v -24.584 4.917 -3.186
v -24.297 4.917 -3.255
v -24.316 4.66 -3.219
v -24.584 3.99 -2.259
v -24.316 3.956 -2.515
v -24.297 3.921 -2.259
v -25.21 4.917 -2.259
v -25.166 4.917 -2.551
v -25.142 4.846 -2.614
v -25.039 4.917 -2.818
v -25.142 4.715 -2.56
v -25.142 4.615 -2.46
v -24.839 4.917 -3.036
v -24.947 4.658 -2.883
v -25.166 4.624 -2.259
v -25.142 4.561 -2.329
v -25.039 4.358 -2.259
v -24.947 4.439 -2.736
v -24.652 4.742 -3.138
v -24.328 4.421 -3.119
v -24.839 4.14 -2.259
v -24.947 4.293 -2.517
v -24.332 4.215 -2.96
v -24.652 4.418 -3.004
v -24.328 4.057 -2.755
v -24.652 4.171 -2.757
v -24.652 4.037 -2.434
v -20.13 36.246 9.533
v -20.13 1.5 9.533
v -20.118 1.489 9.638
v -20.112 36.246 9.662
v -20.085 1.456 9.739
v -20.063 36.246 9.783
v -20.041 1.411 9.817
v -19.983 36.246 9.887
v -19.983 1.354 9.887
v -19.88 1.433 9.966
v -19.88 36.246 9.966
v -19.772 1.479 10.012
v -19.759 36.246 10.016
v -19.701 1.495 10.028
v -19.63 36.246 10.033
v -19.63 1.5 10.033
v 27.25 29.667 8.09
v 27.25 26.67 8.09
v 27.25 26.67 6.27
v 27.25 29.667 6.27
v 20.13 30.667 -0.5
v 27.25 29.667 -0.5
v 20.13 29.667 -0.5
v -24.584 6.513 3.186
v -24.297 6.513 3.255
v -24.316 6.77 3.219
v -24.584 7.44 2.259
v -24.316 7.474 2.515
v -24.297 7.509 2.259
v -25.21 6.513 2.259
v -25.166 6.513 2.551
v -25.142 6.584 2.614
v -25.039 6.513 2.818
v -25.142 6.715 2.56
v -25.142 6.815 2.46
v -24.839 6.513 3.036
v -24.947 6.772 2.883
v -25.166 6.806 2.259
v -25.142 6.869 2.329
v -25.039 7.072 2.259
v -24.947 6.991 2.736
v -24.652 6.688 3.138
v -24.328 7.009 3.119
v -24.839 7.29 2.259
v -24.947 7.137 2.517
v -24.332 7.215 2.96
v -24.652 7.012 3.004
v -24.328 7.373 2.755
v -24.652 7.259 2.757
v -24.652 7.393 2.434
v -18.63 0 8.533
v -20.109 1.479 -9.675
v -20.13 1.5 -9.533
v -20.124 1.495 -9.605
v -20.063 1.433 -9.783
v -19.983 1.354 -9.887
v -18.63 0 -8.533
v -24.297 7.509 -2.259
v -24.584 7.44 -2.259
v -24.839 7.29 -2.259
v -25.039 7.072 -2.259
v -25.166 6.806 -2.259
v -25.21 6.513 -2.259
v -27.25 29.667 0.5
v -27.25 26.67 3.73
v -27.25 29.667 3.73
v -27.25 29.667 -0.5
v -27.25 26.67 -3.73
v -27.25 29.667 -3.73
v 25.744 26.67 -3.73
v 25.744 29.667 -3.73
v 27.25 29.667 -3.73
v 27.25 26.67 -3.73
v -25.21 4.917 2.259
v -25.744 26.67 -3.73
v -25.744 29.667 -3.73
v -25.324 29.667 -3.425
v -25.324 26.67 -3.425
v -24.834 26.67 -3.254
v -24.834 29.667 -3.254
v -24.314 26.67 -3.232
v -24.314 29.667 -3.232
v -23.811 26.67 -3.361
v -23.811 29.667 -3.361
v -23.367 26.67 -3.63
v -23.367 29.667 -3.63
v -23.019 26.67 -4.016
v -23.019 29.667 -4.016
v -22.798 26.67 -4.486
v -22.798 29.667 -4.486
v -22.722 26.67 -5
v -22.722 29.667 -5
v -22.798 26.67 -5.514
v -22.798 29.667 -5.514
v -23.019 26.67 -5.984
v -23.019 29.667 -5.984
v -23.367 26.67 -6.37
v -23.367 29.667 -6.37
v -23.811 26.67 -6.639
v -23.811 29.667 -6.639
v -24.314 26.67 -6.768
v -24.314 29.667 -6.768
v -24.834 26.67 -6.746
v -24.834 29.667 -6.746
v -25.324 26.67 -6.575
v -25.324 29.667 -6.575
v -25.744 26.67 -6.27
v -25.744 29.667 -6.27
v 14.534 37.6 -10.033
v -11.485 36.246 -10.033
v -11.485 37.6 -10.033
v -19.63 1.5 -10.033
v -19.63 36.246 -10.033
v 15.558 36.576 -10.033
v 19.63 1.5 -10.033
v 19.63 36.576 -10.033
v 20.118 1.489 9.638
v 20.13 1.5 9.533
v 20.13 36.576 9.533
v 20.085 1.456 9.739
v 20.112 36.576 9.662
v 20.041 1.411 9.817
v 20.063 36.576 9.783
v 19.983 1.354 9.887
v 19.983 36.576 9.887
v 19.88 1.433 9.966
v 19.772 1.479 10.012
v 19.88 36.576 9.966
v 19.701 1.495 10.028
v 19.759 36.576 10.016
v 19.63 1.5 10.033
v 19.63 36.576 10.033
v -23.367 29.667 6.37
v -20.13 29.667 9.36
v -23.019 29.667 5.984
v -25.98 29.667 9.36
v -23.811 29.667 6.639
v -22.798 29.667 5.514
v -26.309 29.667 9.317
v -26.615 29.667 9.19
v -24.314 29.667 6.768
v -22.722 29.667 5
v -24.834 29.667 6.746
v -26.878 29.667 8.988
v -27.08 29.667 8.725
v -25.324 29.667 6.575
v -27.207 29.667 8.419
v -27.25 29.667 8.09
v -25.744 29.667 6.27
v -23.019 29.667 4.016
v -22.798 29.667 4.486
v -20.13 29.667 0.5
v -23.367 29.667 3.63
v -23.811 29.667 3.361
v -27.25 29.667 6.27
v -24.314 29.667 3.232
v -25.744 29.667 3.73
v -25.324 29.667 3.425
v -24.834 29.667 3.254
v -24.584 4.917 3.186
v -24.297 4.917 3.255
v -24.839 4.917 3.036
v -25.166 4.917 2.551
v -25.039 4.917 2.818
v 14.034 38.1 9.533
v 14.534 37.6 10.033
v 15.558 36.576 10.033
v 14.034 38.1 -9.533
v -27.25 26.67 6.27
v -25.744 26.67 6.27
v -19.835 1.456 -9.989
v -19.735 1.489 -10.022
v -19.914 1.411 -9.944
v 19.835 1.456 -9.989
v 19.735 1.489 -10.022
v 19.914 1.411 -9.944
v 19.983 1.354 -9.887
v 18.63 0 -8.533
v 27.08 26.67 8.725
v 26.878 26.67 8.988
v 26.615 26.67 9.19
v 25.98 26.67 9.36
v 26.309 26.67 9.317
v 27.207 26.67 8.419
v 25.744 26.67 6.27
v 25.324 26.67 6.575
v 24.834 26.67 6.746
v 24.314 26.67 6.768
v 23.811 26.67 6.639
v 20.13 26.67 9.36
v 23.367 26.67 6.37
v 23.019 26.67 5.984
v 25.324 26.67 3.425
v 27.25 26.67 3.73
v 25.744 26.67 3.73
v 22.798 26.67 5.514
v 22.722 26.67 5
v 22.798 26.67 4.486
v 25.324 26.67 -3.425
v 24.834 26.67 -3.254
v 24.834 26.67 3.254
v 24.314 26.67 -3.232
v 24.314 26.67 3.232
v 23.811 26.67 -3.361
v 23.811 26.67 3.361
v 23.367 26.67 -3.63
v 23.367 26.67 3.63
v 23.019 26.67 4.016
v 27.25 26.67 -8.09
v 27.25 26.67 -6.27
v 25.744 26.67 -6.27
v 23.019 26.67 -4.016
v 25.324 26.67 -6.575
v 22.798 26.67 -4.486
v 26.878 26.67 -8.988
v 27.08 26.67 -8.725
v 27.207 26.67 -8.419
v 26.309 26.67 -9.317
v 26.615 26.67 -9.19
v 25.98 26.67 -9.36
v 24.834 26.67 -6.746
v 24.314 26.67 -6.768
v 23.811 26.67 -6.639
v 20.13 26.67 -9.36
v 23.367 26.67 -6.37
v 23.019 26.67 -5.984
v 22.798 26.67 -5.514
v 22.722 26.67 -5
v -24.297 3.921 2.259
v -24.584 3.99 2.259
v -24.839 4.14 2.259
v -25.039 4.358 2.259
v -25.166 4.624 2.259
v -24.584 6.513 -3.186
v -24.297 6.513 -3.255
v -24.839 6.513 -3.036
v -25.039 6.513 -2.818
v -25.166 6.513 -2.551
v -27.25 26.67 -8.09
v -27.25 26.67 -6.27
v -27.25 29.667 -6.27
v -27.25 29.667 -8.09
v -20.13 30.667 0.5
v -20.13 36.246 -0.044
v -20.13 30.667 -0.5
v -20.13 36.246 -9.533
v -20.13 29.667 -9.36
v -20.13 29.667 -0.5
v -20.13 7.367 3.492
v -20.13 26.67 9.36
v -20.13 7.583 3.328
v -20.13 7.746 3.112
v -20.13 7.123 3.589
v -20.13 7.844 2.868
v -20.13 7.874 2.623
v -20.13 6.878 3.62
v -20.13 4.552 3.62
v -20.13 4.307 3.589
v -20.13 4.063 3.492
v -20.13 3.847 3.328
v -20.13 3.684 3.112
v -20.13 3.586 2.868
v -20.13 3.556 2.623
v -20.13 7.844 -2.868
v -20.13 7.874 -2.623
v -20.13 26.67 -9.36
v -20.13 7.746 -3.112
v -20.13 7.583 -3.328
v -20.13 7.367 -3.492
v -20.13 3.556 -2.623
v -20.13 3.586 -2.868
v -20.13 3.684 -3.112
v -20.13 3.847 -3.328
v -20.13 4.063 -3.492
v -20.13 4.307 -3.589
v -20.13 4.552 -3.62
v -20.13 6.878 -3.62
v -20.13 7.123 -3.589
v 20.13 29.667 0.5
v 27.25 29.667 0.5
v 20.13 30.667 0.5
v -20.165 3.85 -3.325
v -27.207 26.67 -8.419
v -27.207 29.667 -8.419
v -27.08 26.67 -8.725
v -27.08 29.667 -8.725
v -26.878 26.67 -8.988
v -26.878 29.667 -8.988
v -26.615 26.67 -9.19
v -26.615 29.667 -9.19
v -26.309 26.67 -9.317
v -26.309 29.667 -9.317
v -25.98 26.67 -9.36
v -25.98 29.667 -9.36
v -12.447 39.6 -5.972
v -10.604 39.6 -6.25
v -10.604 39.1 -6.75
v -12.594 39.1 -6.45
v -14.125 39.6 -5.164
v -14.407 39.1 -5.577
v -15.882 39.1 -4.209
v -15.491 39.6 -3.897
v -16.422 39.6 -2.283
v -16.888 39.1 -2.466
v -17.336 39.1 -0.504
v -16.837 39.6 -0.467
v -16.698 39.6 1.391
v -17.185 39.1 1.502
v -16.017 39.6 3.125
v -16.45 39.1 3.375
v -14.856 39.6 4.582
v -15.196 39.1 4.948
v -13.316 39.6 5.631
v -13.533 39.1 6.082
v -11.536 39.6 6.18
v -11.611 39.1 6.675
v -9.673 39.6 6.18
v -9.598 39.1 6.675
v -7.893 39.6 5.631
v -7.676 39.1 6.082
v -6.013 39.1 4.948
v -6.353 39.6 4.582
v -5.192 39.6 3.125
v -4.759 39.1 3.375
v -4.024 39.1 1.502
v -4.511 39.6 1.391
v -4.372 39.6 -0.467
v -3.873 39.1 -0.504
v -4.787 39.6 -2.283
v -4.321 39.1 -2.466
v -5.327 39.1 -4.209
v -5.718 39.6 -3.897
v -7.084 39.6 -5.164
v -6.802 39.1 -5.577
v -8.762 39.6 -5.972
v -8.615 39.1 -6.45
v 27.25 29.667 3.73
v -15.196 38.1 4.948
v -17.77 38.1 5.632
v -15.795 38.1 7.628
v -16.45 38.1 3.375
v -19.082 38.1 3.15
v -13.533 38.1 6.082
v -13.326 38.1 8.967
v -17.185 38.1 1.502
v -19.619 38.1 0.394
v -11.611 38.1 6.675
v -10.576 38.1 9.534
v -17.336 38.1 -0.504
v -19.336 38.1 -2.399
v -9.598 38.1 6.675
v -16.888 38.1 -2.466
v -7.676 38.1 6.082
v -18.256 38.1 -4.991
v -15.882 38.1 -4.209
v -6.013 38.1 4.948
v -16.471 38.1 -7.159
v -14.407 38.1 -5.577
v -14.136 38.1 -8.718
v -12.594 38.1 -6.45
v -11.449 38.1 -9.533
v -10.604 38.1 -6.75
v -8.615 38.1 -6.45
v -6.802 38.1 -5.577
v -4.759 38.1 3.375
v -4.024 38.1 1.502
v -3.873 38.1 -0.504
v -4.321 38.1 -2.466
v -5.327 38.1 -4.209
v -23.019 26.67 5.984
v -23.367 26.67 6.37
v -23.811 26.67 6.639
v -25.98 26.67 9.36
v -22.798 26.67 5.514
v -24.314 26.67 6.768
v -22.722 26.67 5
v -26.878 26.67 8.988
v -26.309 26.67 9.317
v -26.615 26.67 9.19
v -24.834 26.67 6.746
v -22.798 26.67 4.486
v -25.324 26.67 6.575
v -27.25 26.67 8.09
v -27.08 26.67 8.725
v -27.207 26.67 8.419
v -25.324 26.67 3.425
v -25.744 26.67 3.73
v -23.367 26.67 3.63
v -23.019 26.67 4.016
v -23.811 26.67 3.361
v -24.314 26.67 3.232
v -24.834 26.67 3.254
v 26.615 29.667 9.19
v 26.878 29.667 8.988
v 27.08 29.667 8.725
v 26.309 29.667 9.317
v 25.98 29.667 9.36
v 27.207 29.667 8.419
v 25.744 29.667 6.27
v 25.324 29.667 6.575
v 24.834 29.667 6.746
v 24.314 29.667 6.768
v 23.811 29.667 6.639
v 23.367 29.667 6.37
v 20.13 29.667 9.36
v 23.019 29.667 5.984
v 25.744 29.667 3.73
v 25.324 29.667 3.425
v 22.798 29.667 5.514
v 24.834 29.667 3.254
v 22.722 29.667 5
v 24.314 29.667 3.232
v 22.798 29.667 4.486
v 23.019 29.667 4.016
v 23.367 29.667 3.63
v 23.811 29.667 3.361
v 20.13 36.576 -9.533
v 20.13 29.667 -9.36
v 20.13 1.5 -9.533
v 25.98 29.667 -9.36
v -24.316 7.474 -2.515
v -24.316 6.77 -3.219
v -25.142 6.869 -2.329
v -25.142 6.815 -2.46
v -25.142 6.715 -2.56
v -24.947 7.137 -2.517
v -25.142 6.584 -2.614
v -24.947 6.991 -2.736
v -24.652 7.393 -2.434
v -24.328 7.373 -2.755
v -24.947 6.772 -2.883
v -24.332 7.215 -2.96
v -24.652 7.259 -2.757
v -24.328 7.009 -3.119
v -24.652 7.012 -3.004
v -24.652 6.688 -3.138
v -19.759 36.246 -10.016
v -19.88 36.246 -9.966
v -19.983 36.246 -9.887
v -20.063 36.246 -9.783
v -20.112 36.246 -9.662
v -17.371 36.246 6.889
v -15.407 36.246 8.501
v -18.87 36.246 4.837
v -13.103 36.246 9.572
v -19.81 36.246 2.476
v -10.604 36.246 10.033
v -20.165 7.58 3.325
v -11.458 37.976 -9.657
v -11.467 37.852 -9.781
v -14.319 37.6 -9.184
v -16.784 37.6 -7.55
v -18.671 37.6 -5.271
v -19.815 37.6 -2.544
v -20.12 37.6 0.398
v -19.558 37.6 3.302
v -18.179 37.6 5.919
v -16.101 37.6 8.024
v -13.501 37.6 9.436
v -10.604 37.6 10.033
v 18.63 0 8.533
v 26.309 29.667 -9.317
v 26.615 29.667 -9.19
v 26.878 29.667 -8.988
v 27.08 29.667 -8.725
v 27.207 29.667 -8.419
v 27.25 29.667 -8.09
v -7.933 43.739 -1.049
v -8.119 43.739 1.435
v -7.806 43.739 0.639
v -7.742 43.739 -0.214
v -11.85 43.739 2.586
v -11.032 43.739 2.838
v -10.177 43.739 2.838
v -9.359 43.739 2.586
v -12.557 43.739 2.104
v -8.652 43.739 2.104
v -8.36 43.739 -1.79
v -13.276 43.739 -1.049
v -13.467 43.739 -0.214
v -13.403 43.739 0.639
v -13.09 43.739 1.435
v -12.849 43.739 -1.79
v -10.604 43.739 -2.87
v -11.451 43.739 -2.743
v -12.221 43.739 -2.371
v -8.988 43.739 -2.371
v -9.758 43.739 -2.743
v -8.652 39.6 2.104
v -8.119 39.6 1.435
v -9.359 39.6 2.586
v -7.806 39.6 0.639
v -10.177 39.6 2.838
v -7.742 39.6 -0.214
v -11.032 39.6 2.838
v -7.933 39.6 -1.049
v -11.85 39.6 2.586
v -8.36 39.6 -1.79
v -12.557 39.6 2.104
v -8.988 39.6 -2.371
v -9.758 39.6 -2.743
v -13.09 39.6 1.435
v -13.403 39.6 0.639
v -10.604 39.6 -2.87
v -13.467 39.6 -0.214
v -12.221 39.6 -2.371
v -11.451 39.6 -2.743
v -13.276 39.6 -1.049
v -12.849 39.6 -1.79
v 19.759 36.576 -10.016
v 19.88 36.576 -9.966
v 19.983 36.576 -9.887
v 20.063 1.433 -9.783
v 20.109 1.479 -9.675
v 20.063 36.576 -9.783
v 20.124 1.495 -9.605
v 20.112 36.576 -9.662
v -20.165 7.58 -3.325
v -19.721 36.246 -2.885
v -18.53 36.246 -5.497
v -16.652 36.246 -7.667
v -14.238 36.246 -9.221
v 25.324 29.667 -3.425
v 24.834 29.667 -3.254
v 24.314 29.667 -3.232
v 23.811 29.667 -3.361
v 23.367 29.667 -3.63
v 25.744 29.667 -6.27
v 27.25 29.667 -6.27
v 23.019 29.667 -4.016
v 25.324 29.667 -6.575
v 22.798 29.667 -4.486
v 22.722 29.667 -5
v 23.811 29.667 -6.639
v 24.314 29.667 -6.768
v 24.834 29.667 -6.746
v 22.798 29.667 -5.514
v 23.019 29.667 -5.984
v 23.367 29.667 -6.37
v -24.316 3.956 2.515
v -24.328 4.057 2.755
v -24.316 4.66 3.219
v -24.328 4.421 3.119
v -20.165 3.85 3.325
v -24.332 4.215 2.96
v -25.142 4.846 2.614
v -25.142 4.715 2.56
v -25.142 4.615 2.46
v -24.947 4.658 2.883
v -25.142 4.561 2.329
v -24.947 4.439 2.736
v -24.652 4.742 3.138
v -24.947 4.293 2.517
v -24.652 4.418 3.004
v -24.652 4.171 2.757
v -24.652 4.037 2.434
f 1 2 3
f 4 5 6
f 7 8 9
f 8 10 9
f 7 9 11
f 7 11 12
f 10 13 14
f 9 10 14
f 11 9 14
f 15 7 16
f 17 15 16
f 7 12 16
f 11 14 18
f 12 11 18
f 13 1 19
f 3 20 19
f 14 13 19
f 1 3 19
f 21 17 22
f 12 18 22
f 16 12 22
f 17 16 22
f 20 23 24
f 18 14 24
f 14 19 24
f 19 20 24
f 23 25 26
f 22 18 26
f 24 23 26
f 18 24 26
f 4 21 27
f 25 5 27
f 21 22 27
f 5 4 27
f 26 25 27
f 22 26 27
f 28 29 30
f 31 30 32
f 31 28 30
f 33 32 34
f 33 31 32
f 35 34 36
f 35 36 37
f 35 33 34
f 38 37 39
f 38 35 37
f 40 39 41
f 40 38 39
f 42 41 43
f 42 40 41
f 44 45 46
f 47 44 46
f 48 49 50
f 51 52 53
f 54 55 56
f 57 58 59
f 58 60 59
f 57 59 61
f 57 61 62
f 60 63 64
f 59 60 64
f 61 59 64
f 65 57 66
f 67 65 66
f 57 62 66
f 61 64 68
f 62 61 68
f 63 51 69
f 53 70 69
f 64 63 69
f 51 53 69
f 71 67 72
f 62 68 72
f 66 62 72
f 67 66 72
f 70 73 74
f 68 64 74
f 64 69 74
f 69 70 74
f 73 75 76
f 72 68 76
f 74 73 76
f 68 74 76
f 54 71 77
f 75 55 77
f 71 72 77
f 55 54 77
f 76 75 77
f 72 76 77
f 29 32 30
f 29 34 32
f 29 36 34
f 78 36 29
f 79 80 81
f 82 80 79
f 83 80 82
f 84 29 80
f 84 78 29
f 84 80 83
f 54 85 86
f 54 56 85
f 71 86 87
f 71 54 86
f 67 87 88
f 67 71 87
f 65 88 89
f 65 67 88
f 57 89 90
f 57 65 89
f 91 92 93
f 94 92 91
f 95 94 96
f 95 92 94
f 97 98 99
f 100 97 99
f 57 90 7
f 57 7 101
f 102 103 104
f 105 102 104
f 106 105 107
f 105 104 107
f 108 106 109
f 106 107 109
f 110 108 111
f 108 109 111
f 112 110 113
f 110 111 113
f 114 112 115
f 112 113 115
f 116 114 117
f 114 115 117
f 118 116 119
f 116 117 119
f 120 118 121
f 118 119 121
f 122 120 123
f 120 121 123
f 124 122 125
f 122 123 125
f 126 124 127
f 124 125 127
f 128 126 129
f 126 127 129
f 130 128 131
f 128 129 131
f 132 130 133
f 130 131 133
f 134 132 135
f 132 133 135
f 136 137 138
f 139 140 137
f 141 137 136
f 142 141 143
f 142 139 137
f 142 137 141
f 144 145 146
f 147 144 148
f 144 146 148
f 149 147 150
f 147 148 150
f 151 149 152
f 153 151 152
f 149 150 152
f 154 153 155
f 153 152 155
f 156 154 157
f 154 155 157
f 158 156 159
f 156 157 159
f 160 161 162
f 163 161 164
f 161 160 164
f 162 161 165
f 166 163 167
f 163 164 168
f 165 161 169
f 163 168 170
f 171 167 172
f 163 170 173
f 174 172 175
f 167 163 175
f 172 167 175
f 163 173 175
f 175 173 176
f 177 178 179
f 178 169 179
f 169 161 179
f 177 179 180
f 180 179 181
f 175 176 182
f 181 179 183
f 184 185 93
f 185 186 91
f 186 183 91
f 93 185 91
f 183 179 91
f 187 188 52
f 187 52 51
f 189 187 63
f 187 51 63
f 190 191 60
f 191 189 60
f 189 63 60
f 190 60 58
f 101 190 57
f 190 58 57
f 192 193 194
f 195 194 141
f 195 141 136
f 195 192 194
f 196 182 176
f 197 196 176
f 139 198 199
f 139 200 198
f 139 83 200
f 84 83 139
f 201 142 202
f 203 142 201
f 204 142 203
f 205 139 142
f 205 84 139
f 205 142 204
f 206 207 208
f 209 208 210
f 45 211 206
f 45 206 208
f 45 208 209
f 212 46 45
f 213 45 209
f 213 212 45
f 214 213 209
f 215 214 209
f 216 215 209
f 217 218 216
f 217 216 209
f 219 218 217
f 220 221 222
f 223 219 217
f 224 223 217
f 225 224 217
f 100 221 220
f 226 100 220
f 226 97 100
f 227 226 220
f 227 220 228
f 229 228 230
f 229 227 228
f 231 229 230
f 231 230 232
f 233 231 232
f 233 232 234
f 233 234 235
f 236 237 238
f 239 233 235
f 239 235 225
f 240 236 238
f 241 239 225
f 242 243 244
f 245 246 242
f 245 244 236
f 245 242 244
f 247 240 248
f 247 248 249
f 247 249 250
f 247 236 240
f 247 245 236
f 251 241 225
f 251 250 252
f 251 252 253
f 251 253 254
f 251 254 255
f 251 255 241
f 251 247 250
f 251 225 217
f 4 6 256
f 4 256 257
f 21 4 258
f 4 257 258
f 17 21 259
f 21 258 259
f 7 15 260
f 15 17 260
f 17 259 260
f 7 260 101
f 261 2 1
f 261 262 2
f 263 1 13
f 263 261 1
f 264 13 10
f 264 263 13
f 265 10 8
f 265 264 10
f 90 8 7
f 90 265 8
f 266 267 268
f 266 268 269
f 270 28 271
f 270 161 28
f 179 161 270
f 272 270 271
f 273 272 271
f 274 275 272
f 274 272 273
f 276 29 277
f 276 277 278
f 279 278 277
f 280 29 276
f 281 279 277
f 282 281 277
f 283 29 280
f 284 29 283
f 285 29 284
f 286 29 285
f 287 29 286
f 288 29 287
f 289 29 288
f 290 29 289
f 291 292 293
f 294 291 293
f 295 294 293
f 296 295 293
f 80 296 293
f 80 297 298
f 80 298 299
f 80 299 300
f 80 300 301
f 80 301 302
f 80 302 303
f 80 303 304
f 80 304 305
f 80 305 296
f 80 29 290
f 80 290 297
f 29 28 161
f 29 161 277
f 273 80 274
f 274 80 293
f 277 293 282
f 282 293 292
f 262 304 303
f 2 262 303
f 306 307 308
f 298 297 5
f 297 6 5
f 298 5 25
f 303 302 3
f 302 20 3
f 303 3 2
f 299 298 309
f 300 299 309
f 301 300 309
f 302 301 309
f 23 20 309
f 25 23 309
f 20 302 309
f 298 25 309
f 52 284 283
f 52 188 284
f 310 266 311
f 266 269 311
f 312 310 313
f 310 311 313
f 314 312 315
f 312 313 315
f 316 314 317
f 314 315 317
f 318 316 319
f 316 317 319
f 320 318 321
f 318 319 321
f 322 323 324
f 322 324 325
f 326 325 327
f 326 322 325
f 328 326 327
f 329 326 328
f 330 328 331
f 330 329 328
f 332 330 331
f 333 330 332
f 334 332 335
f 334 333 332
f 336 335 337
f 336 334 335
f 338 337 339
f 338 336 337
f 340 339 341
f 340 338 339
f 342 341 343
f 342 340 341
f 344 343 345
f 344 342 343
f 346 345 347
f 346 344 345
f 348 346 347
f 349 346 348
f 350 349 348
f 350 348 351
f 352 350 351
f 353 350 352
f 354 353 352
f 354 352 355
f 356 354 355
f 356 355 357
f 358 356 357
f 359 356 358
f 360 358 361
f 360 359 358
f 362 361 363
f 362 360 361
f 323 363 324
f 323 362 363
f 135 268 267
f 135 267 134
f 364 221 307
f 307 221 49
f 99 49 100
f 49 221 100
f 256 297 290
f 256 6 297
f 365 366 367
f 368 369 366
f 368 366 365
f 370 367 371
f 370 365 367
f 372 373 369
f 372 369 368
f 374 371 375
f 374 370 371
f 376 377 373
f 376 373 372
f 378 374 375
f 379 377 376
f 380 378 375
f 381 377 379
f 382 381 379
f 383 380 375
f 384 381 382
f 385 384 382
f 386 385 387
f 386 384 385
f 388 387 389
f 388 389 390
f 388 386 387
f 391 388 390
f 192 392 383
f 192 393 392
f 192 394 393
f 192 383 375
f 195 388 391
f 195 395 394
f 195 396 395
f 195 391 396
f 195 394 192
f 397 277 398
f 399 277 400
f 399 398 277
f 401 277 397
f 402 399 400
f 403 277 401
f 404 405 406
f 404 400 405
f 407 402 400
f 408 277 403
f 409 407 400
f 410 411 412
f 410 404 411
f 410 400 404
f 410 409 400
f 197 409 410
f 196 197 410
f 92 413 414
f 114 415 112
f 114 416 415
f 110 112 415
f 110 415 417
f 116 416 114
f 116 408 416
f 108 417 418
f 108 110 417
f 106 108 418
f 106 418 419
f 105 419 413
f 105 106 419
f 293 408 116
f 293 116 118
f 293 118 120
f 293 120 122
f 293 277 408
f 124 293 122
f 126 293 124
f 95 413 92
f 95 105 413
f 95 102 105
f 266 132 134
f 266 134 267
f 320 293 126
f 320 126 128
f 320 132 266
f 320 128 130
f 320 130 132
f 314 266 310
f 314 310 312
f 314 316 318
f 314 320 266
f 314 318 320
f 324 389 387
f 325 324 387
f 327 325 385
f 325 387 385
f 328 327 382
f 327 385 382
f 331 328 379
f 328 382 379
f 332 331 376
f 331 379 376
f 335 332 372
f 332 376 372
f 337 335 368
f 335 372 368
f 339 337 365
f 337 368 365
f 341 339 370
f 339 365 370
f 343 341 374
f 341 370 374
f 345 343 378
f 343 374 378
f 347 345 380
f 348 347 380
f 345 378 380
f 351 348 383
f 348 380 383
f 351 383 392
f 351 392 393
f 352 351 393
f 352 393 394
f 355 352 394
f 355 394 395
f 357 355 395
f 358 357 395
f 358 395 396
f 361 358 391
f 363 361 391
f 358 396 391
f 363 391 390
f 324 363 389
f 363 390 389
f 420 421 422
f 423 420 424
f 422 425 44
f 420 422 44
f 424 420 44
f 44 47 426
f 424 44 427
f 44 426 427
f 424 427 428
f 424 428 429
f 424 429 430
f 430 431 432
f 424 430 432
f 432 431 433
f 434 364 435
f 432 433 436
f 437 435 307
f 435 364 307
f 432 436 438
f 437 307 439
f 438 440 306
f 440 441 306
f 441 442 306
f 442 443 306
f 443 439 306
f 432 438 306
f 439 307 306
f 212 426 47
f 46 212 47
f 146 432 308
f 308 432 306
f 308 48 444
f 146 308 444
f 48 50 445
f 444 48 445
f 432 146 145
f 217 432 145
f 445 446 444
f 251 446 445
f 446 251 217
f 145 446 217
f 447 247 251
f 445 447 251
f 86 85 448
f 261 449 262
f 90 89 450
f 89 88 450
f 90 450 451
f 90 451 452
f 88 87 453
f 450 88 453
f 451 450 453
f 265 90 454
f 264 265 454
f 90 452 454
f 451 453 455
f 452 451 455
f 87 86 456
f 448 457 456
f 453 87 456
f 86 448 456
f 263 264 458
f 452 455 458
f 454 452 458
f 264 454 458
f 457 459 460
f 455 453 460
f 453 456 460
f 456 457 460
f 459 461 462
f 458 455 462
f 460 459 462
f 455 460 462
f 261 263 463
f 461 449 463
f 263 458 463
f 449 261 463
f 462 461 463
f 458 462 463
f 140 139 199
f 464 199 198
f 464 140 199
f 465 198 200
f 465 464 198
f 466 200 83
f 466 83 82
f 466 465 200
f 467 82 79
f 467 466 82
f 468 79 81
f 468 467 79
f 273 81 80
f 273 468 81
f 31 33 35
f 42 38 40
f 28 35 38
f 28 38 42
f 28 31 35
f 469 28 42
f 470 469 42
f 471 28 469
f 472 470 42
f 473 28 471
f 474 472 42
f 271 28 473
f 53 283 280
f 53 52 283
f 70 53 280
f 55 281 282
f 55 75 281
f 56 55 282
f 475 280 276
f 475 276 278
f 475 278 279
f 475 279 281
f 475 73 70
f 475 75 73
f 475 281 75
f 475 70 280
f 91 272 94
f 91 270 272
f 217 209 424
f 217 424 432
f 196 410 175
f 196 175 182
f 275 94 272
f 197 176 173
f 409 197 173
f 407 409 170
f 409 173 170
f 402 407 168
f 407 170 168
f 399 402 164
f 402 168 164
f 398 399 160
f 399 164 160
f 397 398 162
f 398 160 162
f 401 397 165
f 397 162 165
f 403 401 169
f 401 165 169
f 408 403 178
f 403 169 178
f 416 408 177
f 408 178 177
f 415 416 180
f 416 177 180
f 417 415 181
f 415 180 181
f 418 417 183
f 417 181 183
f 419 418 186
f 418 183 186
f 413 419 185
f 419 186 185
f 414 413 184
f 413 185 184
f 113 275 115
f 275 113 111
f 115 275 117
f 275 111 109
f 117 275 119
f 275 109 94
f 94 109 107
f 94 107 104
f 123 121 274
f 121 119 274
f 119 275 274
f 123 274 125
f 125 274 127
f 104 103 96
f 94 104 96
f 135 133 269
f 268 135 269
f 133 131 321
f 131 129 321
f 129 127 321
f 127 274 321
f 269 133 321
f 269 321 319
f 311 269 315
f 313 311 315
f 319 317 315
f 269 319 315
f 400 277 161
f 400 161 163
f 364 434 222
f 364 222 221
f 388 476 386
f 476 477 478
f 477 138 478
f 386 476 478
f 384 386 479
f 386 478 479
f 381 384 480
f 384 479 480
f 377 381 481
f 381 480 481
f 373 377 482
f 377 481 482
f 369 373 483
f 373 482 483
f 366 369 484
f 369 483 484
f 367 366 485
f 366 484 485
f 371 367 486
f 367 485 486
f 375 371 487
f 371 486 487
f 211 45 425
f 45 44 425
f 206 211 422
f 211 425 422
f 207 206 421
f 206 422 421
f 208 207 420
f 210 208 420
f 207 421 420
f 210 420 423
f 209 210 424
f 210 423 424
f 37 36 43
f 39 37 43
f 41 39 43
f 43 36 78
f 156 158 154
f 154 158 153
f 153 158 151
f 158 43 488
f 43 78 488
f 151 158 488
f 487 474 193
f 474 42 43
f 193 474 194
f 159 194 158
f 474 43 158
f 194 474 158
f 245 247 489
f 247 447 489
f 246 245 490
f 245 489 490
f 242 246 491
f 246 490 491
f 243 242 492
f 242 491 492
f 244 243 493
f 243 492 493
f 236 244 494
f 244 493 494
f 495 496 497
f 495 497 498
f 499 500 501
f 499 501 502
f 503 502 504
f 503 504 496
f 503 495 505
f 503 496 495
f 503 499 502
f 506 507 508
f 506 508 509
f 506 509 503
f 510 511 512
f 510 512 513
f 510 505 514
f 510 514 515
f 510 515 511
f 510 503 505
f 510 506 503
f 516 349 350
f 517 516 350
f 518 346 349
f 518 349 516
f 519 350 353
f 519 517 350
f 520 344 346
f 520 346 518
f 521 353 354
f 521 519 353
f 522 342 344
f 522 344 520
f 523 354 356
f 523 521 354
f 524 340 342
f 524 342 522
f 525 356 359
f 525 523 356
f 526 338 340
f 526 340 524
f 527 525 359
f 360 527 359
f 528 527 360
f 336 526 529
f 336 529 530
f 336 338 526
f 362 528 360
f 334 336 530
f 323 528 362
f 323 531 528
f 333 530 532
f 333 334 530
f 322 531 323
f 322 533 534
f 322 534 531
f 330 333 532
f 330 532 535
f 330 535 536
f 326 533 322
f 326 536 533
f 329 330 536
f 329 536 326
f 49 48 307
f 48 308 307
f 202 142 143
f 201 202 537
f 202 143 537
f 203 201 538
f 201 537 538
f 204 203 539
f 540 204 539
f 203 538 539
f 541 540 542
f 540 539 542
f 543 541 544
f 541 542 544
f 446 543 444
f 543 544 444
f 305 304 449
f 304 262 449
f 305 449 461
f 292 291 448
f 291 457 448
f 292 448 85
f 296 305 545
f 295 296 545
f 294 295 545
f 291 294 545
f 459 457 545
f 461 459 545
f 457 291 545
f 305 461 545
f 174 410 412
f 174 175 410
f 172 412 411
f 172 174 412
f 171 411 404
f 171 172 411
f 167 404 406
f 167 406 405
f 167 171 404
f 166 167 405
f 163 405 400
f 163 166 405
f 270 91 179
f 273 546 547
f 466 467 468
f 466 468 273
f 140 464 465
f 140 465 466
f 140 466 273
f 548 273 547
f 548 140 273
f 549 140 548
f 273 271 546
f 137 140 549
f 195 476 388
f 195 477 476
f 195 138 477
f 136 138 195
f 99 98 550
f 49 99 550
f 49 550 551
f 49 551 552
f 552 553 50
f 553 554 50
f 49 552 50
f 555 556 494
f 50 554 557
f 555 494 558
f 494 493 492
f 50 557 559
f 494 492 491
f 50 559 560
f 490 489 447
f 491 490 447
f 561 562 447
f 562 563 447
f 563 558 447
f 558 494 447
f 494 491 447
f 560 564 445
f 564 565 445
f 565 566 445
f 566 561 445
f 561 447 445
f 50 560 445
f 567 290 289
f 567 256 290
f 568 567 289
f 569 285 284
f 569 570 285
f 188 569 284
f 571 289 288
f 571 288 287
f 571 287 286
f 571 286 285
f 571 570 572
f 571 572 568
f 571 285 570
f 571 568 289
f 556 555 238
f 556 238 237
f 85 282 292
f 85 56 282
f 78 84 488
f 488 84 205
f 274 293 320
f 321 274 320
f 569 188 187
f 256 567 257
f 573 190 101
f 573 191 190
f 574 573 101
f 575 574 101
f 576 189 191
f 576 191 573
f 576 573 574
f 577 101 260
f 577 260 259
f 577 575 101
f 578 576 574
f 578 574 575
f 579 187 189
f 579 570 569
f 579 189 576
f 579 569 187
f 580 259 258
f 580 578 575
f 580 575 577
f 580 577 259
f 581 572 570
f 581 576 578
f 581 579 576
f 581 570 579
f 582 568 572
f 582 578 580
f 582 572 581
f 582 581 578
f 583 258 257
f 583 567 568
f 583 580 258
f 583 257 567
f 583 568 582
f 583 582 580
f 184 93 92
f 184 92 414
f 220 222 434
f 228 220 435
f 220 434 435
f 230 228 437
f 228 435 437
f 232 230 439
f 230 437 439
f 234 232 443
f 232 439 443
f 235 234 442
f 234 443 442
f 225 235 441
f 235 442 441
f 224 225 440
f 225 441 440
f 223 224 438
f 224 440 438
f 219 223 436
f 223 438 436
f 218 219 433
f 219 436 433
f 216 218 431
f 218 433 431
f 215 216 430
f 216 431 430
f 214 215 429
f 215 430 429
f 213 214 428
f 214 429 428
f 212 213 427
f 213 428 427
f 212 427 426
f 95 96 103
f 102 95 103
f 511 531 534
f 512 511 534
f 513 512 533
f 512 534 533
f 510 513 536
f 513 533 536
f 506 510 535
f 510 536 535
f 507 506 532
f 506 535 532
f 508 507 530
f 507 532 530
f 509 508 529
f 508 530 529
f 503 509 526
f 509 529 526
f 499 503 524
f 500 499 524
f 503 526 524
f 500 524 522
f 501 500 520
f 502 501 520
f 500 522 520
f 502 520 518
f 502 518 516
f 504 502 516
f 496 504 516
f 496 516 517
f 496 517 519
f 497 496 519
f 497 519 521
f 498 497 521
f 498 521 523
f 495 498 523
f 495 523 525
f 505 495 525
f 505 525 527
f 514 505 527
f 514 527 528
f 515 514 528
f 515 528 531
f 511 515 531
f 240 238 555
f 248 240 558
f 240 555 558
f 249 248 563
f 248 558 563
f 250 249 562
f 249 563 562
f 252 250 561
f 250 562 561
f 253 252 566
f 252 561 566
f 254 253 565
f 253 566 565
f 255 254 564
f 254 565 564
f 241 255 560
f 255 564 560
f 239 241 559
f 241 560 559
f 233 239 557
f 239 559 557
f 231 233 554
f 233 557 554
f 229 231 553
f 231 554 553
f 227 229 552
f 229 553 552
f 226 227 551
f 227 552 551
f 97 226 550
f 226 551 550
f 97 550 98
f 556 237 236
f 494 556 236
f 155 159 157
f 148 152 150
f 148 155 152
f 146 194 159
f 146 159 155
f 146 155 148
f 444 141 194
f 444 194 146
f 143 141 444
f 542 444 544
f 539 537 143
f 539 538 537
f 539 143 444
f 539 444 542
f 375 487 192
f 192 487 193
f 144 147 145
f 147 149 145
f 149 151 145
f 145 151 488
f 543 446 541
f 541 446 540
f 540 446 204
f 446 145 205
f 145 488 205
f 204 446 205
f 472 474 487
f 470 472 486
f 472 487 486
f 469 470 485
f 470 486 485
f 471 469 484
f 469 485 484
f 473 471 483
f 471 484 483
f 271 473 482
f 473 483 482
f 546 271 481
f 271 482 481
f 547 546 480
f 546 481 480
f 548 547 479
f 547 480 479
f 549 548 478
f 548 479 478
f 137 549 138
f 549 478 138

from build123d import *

# Parameters (mm, degrees)
SKETCH1_W           = 40.259
SKETCH1_H           = 20.066
BOSS_EXTRUDE1_DEPTH = 38.1
SKETCH2_W           = 54.5
SKETCH2_H           = 18.7198
BOSS_EXTRUDE2_DEPTH = 2.9972
SKETCH3_R           = 2.8702
BOSS_EXTRUDE3_DEPTH = 5.6388
SKETCH4_R           = 1.778
CUT_EXTRUDE1_DEPTH  = 42.513447759
SKETCH5_W           = 7.62
SKETCH5_H           = 2.54
SKETCH5_W_2         = 6.35
CUT_EXTRUDE2_DEPTH  = 42.513447759
FILLET2_R           = 1.27
SKETCH6_W           = 7.239
SKETCH6_H           = 4.318
BOSS_EXTRUDE4_DEPTH = 5.08
BOSS_EXTRUDE4_TAPER = 5
SKETCH7_W           = 4.572
SKETCH7_H           = 20.066
CUT_EXTRUDE3_DEPTH  = 1.524
CHAMFER1_SIZE       = 1.524
CUT_EXTRUDE4_DEPTH  = 1.8542
SKETCH9_R           = 6.75
BOSS_EXTRUDE5_DEPTH = 1.5
CHAMFER2_SIZE       = 0.5
CHAMFER3_SIZE       = 1.5
FILLET3_R           = 0.5
BOSS_EXTRUDE6_DEPTH = 0.5
FILLET4_R           = 1


with BuildPart() as part:
    # Sketch1 → Boss-Extrude1 (new body)
    with BuildSketch(Plane(origin=(0, 0, 0), x_dir=(1, 0, 0), z_dir=(0, 1, 0))):
        Rectangle(SKETCH1_W, SKETCH1_H)
    extrude(amount=BOSS_EXTRUDE1_DEPTH)

    # Sketch2 → Boss-Extrude2 (add)
    with BuildSketch(Plane(origin=(0, 26.67, 0), x_dir=(-1, 0, 0), z_dir=(0, -1, 0))):
        Rectangle(SKETCH2_W, SKETCH2_H)
    extrude(amount=-BOSS_EXTRUDE2_DEPTH)

    # Sketch3 → Boss-Extrude3 (add)
    with BuildSketch(Plane(origin=(0, 38.1, 0), x_dir=(1, 0, 0), z_dir=(0, 1, 0))):
        with Locations(Location((-10.6045, 0, 0), (0, 0, 90))):
            Circle(SKETCH3_R)
    extrude(amount=BOSS_EXTRUDE3_DEPTH)

    # Sketch4 → Cut-Extrude1 (cut, through all)
    with BuildSketch(Plane(origin=(0, 29.6672, 0), x_dir=(1, 0, 0), z_dir=(0, 1, 0))):
        with Locations(Location((-24.5, 5, 0), (0, 0, 270))):
            Circle(SKETCH4_R)
        with Locations(Location((-24.5, -5, 0), (0, 0, 270))):
            Circle(SKETCH4_R)
        with Locations(Location((24.5, -5, 0), (0, 0, 270))):
            Circle(SKETCH4_R)
        with Locations(Location((24.5, 5, 0), (0, 0, 270))):
            Circle(SKETCH4_R)
    extrude(amount=-CUT_EXTRUDE1_DEPTH, mode=Mode.SUBTRACT)

    # Sketch5 → Cut-Extrude2 (cut, through all)
    with BuildSketch(Plane(origin=(0, 29.6672, 0), x_dir=(1, 0, 0), z_dir=(0, 1, 0))):
        with Locations((-28.31, 5)):
            Rectangle(SKETCH5_W, SKETCH5_H)
        with Locations((-27.675, -5)):
            Rectangle(SKETCH5_W_2, SKETCH5_H)
        with Locations((27.675, 5)):
            Rectangle(SKETCH5_W_2, SKETCH5_H)
        with Locations((27.675, -5)):
            Rectangle(SKETCH5_W_2, SKETCH5_H)
    extrude(amount=-CUT_EXTRUDE2_DEPTH, mode=Mode.SUBTRACT)

    # Fillet2
    fillet2_edges = [part.edges().sort_by_distance(p)[0] for p in [
        (27.25, 28.1686, -9.3599),
        (-27.25, 28.1686, 9.3599),
        (27.25, 28.1686, 9.3599),
        (-27.25, 28.1686, -9.3599),
    ]]
    fillet(fillet2_edges, radius=FILLET2_R)

    # Sketch6 → Boss-Extrude4 (add)
    with BuildSketch(Plane.ZY.offset(20.1295)):
        with Locations((0, 5.715)):
            Rectangle(SKETCH6_W, SKETCH6_H)
    extrude(amount=BOSS_EXTRUDE4_DEPTH, taper=BOSS_EXTRUDE4_TAPER)

    # Sketch7 → Cut-Extrude3 (cut)
    with BuildSketch(Plane(origin=(0, 38.1, 0), x_dir=(1, 0, 0), z_dir=(0, 1, 0))):
        with Locations((17.8435, 0)):
            Rectangle(SKETCH7_W, SKETCH7_H)
    extrude(amount=-CUT_EXTRUDE3_DEPTH, mode=Mode.SUBTRACT)

    # Chamfer1
    chamfer1_edges = [part.edges().sort_by_distance(p)[0] for p in [
        (15.5575, 38.1, 0),
    ]]
    chamfer(chamfer1_edges, length=CHAMFER1_SIZE - 0.0001)  # a hair under: the kernel refuses the full size

    # Sketch8 → Cut-Extrude4 (cut)
    with BuildSketch(Plane(origin=(0, 38.1, 0), x_dir=(1, 0, 0), z_dir=(0, 1, 0))):
        with BuildLine():
            Line((-10.6045, 10.121534413), (-31.431367674, 17.812165279))
            Line((-31.431367674, 17.812165279), (-23.526690426, -15.868179363))
            Line((-23.526690426, -15.868179363), (-10.6045, -10.033))
            ThreePointArc((-10.6045, -10.033), (-20.1295, 0.044267206), (-10.6045, 10.121534413))
        make_face()
    extrude(amount=-CUT_EXTRUDE4_DEPTH, mode=Mode.SUBTRACT)

    # Sketch9 → Boss-Extrude5 (add)
    with BuildSketch(Plane(origin=(0, 38.1, 0), x_dir=(1, 0, 0), z_dir=(0, 1, 0))):
        with Locations(Location((-10.6045, 0, 0), (0, 0, 90))):
            Circle(SKETCH9_R)
    extrude(amount=BOSS_EXTRUDE5_DEPTH)

    # Chamfer2
    chamfer2_edges = [part.edges().sort_by_distance(p)[0] for p in [
        (1.274211255, 38.1, -10.033),
    ]]
    chamfer(chamfer2_edges, length=CHAMFER2_SIZE)
    chamfer2_2_edges = [part.edges().sort_by_distance(p)[0] for p in [
        (-20.022463004, 38.1, 1.421765307),
    ]]
    chamfer(chamfer2_2_edges, length=CHAMFER2_SIZE)
    chamfer2_3_edges = [part.edges().sort_by_distance(p)[0] for p in [
        (-10.6045, 39.6, 6.75),
    ]]
    chamfer(chamfer2_3_edges, length=CHAMFER2_SIZE)

    # Chamfer3
    chamfer3_edges = [part.edges().sort_by_distance(p)[0] for p in [
        (0, 0, 10.033),
        (-20.1295, 0, 0),
        (0, 0, -10.033),
        (20.1295, 0, 0),
    ]]
    chamfer(chamfer3_edges, length=CHAMFER3_SIZE)

    # Fillet3
    fillet3_edges = [part.edges().sort_by_distance(p)[0] for p in [
        (20.1295, 19.038, 10.033),
        (20.1295, 19.038, -10.033),
        (-20.1295, 18.8729, 10.033),
        (-20.1295, 18.8729, -10.033),
    ]]
    fillet(fillet3_edges, radius=FILLET3_R)

    # Sketch12 → Boss-Extrude6 (add, symmetric)
    with BuildSketch(Plane.XY):
        Polygon((-27.25, 29.6672), (-20.1295, 29.6672), (-20.1295, 30.6672), align=None)
    boss_extrude6 = extrude(amount=BOSS_EXTRUDE6_DEPTH, both=True)

    # Mirror1: Boss-Extrude6 across plane
    add(boss_extrude6.mirror(Plane(origin=(0, 0, 0), x_dir=(0, 0, 1), z_dir=(1, 0, 0))))

    # Fillet4
    fillet4_edges = [part.edges().sort_by_distance(p)[0] for p in [
        (-22.6695, 3.778221205, 3.397278795),
        (-22.6695, 7.651778795, 3.397278795),
        (-22.6695, 7.651778795, -3.397278795),
        (-22.6695, 3.778221205, -3.397278795),
        (-25.2095, 5.715, 3.175057589),
        (-25.2095, 7.429557589, 0),
        (-25.2095, 5.715, -3.175057589),
        (-25.2095, 4.000442411, 0),
    ]]
    fillet(fillet4_edges, radius=FILLET4_R)


solid = part.part
